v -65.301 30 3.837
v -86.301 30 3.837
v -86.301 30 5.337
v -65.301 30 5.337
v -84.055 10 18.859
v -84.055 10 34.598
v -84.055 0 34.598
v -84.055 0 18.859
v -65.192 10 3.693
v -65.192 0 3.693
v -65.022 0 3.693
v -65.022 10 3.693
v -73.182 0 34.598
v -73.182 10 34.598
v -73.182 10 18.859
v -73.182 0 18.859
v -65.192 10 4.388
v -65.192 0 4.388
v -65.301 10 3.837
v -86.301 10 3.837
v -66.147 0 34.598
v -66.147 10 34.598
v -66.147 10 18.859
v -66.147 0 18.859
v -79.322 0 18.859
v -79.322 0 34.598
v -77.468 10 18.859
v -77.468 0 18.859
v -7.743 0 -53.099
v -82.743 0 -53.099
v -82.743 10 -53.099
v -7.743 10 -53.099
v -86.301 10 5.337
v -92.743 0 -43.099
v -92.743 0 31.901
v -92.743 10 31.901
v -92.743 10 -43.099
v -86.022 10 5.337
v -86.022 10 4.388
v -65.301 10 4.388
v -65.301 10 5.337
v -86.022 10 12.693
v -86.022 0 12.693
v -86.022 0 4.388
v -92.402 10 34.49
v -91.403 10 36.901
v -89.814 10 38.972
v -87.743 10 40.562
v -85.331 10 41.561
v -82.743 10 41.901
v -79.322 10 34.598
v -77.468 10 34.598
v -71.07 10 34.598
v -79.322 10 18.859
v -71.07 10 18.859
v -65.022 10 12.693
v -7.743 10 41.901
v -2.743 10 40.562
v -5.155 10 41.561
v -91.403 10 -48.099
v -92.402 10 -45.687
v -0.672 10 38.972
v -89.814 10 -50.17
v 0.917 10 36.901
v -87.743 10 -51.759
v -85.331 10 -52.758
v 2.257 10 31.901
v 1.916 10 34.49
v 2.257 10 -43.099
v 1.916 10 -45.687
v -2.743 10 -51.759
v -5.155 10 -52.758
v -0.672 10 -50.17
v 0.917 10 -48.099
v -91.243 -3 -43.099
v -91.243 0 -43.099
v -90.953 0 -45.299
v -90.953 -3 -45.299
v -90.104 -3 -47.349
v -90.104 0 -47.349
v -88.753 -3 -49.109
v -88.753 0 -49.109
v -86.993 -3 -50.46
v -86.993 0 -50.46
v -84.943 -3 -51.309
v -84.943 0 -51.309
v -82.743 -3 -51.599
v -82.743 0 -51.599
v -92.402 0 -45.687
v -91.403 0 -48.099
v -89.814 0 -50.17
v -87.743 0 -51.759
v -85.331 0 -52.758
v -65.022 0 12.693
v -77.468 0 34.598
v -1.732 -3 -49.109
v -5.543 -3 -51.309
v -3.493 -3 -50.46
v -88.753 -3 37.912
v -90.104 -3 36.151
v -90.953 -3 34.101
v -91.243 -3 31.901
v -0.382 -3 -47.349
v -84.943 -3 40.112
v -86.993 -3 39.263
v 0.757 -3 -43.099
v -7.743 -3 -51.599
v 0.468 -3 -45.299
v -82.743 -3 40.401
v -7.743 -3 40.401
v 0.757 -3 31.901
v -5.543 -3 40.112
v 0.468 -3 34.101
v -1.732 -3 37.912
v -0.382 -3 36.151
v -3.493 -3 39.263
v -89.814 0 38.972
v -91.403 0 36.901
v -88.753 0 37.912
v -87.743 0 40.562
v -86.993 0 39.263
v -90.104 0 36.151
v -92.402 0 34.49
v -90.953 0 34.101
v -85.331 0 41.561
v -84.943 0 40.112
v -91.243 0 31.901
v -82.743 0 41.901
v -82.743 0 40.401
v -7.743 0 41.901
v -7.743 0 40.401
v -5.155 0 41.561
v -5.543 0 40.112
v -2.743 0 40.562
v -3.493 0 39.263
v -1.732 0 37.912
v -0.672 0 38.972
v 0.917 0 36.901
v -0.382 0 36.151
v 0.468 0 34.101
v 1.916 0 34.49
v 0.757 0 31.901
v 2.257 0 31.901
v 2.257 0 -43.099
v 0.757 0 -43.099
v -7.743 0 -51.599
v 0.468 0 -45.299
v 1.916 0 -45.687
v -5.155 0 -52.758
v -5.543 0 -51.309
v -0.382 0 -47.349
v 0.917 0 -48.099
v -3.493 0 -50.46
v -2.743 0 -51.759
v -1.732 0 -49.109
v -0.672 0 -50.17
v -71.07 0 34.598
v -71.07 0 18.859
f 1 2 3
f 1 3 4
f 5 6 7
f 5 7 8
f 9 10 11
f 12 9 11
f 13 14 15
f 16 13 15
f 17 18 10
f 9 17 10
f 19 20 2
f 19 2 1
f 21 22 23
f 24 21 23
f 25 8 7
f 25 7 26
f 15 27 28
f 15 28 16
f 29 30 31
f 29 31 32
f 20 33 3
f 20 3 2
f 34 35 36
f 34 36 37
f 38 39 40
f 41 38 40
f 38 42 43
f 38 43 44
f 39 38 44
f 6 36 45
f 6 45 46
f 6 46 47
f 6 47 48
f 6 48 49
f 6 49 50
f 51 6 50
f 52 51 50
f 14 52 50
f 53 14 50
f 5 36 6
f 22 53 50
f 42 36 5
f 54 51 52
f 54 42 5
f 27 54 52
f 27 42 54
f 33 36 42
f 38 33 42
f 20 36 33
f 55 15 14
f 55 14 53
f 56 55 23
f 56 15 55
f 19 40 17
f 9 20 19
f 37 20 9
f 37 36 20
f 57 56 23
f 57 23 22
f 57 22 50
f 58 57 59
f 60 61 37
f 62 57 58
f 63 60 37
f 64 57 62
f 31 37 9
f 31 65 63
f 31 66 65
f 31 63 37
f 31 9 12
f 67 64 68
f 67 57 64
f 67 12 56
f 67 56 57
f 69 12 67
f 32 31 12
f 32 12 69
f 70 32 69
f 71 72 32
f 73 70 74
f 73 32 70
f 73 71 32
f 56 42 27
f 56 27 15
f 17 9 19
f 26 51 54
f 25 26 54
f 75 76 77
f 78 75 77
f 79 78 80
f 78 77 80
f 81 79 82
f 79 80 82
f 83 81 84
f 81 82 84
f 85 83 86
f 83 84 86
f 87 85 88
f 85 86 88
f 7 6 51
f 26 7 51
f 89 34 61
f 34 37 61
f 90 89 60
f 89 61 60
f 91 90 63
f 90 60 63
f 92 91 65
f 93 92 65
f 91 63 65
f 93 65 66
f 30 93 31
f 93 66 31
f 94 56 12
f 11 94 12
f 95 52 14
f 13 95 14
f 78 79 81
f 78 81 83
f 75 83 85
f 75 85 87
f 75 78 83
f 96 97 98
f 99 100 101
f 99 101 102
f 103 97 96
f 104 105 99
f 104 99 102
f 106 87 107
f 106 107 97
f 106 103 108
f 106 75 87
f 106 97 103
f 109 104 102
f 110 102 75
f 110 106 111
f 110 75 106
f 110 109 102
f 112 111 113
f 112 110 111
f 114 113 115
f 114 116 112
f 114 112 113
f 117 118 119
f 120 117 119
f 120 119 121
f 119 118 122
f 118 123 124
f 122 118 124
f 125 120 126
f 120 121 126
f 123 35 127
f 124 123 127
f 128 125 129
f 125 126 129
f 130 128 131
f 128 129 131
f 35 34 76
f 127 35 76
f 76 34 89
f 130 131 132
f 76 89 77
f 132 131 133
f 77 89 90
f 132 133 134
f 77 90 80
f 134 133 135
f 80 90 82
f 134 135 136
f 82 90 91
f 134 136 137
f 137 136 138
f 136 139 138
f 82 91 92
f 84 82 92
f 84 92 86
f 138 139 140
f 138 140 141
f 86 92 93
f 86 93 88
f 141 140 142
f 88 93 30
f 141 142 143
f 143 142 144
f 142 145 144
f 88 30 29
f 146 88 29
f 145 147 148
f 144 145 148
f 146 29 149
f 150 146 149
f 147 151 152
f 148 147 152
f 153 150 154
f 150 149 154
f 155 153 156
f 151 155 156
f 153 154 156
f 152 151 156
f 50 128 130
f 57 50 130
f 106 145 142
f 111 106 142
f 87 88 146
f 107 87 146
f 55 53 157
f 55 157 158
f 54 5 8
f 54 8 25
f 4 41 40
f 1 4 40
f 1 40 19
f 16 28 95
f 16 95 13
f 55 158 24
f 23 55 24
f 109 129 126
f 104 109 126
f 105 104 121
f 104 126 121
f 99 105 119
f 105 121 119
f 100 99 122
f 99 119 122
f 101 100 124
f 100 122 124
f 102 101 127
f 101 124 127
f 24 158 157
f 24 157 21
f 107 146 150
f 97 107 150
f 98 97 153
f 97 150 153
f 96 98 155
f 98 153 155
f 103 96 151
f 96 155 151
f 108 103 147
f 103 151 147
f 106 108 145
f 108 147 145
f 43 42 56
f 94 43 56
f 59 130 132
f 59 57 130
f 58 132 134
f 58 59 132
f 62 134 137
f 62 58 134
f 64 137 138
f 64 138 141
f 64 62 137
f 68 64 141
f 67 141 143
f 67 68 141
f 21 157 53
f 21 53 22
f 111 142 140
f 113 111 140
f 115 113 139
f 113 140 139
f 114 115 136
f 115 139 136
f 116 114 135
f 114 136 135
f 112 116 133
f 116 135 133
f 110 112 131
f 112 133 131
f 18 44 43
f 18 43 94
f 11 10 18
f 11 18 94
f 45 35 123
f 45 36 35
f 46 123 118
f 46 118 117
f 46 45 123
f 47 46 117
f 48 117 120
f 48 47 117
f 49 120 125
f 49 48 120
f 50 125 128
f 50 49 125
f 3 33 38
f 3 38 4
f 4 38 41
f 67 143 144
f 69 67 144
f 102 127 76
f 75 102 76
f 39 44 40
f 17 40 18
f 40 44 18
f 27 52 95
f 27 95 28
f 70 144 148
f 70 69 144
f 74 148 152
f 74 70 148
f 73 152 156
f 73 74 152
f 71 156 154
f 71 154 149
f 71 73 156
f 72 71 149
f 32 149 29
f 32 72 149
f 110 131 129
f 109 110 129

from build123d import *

# Parameters (mm, degrees)
SKETCH1_W            = 95
SKETCH1_H            = 95
BOSS_EXTRUDE1_DEPTH  = 10
FILLET1_R            = 10
BOSS_EXTRUDE2_DEPTH  = 3
SKETCH5_W            = 4.733468523
SKETCH5_H            = 15.739624206
SKETCH5_W_2          = 4.285968544
SKETCH5_W_3          = 4.922499766
CUT_EXTRUDE1_DEPTH   = 10
SKETCH14_W           = 21
SKETCH14_H           = 9
CUT_EXTRUDE2_DEPTH   = 10
SKETCH16_W           = 21.335954762
SKETCH16_H           = 13.618694529
BOSS_EXTRUDE7_DEPTH  = 10
SKETCH20_W           = 21
SKETCH20_H           = 1.5
BOSS_EXTRUDE13_DEPTH = 20


with BuildPart() as part:
    # Sketch1 → Boss-Extrude1 (new body)
    with BuildSketch(Plane(origin=(-45.242822535, 0, -5.598622024), x_dir=(1, 0, 0), z_dir=(0, 1, 0))):
        Rectangle(SKETCH1_W, SKETCH1_H)
    extrude(amount=BOSS_EXTRUDE1_DEPTH)

    # Fillet1
    fillet1_edges = [part.edges().sort_by_distance(p)[0] for p in [
        (2.257177465, 5, 41.901377976),
        (-92.742822535, 5, 41.901377976),
        (-92.742822535, 5, -53.098622024),
        (2.257177465, 5, -53.098622024),
    ]]
    fillet(fillet1_edges, radius=FILLET1_R)

    # Sketch4 → Boss-Extrude2 (add)
    with BuildSketch(Plane(origin=(-45.242822535, 0, -5.598622024), x_dir=(1, 0, 0), z_dir=(0, -1, 0))):
        with BuildLine():
            Line((-46, 37.5), (-46, -37.5))
            ThreePointArc((-46, -37.5), (-43.51040764, -43.51040764), (-37.5, -46))
            Line((-37.5, -46), (37.5, -46))
            ThreePointArc((37.5, -46), (43.51040764, -43.51040764), (46, -37.5))
            Line((46, -37.5), (46, 37.5))
            ThreePointArc((46, 37.5), (43.51040764, 43.51040764), (37.5, 46))
            Line((37.5, 46), (-37.5, 46))
            ThreePointArc((-37.5, 46), (-43.51040764, 43.51040764), (-46, 37.5))
        make_face()
    extrude(amount=BOSS_EXTRUDE2_DEPTH)

    # Sketch5 → Cut-Extrude1 (cut)
    with BuildSketch(Plane(origin=(-45.242822535, 10, -5.598622024), x_dir=(1, 0, 0), z_dir=(0, 1, 0))):
        with Locations((-36.445515764, -32.326942183)):
            Rectangle(SKETCH5_W, SKETCH5_H)
        with Locations((-30.082156711, -32.326942183)):
            Rectangle(SKETCH5_W_2, SKETCH5_H)
        with Locations((-23.365813302, -32.326942183)):
            Rectangle(SKETCH5_W_3, SKETCH5_H)
    extrude(amount=-CUT_EXTRUDE1_DEPTH, mode=Mode.SUBTRACT)

    # Sketch14 → Cut-Extrude2 (cut)
    with BuildSketch(Plane(origin=(0, 10, 0), x_dir=(1, 0, 0), z_dir=(0, 1, 0))):
        with Locations((-75.521903194, -8.192829138)):
            Rectangle(SKETCH14_W, SKETCH14_H)
    extrude(amount=-CUT_EXTRUDE2_DEPTH, mode=Mode.SUBTRACT)

    # Sketch16 → Boss-Extrude7 (add)
    with BuildSketch(Plane(origin=(0, 0, 0), x_dir=(1, 0, 0), z_dir=(0, 1, 0))):
        with Locations((-75.859791542, 2.420926633)):
            Rectangle(SKETCH16_W, SKETCH16_H)
    extrude(amount=BOSS_EXTRUDE7_DEPTH)

    # Sketch20 → Boss-Extrude13 (add)
    with BuildSketch(Plane(origin=(0, 10, 0), x_dir=(1, 0, 0), z_dir=(0, 1, 0))):
        with Locations((-75.800790681, -4.586951107)):
            Rectangle(SKETCH20_W, SKETCH20_H)
    extrude(amount=BOSS_EXTRUDE13_DEPTH)


solid = part.part
